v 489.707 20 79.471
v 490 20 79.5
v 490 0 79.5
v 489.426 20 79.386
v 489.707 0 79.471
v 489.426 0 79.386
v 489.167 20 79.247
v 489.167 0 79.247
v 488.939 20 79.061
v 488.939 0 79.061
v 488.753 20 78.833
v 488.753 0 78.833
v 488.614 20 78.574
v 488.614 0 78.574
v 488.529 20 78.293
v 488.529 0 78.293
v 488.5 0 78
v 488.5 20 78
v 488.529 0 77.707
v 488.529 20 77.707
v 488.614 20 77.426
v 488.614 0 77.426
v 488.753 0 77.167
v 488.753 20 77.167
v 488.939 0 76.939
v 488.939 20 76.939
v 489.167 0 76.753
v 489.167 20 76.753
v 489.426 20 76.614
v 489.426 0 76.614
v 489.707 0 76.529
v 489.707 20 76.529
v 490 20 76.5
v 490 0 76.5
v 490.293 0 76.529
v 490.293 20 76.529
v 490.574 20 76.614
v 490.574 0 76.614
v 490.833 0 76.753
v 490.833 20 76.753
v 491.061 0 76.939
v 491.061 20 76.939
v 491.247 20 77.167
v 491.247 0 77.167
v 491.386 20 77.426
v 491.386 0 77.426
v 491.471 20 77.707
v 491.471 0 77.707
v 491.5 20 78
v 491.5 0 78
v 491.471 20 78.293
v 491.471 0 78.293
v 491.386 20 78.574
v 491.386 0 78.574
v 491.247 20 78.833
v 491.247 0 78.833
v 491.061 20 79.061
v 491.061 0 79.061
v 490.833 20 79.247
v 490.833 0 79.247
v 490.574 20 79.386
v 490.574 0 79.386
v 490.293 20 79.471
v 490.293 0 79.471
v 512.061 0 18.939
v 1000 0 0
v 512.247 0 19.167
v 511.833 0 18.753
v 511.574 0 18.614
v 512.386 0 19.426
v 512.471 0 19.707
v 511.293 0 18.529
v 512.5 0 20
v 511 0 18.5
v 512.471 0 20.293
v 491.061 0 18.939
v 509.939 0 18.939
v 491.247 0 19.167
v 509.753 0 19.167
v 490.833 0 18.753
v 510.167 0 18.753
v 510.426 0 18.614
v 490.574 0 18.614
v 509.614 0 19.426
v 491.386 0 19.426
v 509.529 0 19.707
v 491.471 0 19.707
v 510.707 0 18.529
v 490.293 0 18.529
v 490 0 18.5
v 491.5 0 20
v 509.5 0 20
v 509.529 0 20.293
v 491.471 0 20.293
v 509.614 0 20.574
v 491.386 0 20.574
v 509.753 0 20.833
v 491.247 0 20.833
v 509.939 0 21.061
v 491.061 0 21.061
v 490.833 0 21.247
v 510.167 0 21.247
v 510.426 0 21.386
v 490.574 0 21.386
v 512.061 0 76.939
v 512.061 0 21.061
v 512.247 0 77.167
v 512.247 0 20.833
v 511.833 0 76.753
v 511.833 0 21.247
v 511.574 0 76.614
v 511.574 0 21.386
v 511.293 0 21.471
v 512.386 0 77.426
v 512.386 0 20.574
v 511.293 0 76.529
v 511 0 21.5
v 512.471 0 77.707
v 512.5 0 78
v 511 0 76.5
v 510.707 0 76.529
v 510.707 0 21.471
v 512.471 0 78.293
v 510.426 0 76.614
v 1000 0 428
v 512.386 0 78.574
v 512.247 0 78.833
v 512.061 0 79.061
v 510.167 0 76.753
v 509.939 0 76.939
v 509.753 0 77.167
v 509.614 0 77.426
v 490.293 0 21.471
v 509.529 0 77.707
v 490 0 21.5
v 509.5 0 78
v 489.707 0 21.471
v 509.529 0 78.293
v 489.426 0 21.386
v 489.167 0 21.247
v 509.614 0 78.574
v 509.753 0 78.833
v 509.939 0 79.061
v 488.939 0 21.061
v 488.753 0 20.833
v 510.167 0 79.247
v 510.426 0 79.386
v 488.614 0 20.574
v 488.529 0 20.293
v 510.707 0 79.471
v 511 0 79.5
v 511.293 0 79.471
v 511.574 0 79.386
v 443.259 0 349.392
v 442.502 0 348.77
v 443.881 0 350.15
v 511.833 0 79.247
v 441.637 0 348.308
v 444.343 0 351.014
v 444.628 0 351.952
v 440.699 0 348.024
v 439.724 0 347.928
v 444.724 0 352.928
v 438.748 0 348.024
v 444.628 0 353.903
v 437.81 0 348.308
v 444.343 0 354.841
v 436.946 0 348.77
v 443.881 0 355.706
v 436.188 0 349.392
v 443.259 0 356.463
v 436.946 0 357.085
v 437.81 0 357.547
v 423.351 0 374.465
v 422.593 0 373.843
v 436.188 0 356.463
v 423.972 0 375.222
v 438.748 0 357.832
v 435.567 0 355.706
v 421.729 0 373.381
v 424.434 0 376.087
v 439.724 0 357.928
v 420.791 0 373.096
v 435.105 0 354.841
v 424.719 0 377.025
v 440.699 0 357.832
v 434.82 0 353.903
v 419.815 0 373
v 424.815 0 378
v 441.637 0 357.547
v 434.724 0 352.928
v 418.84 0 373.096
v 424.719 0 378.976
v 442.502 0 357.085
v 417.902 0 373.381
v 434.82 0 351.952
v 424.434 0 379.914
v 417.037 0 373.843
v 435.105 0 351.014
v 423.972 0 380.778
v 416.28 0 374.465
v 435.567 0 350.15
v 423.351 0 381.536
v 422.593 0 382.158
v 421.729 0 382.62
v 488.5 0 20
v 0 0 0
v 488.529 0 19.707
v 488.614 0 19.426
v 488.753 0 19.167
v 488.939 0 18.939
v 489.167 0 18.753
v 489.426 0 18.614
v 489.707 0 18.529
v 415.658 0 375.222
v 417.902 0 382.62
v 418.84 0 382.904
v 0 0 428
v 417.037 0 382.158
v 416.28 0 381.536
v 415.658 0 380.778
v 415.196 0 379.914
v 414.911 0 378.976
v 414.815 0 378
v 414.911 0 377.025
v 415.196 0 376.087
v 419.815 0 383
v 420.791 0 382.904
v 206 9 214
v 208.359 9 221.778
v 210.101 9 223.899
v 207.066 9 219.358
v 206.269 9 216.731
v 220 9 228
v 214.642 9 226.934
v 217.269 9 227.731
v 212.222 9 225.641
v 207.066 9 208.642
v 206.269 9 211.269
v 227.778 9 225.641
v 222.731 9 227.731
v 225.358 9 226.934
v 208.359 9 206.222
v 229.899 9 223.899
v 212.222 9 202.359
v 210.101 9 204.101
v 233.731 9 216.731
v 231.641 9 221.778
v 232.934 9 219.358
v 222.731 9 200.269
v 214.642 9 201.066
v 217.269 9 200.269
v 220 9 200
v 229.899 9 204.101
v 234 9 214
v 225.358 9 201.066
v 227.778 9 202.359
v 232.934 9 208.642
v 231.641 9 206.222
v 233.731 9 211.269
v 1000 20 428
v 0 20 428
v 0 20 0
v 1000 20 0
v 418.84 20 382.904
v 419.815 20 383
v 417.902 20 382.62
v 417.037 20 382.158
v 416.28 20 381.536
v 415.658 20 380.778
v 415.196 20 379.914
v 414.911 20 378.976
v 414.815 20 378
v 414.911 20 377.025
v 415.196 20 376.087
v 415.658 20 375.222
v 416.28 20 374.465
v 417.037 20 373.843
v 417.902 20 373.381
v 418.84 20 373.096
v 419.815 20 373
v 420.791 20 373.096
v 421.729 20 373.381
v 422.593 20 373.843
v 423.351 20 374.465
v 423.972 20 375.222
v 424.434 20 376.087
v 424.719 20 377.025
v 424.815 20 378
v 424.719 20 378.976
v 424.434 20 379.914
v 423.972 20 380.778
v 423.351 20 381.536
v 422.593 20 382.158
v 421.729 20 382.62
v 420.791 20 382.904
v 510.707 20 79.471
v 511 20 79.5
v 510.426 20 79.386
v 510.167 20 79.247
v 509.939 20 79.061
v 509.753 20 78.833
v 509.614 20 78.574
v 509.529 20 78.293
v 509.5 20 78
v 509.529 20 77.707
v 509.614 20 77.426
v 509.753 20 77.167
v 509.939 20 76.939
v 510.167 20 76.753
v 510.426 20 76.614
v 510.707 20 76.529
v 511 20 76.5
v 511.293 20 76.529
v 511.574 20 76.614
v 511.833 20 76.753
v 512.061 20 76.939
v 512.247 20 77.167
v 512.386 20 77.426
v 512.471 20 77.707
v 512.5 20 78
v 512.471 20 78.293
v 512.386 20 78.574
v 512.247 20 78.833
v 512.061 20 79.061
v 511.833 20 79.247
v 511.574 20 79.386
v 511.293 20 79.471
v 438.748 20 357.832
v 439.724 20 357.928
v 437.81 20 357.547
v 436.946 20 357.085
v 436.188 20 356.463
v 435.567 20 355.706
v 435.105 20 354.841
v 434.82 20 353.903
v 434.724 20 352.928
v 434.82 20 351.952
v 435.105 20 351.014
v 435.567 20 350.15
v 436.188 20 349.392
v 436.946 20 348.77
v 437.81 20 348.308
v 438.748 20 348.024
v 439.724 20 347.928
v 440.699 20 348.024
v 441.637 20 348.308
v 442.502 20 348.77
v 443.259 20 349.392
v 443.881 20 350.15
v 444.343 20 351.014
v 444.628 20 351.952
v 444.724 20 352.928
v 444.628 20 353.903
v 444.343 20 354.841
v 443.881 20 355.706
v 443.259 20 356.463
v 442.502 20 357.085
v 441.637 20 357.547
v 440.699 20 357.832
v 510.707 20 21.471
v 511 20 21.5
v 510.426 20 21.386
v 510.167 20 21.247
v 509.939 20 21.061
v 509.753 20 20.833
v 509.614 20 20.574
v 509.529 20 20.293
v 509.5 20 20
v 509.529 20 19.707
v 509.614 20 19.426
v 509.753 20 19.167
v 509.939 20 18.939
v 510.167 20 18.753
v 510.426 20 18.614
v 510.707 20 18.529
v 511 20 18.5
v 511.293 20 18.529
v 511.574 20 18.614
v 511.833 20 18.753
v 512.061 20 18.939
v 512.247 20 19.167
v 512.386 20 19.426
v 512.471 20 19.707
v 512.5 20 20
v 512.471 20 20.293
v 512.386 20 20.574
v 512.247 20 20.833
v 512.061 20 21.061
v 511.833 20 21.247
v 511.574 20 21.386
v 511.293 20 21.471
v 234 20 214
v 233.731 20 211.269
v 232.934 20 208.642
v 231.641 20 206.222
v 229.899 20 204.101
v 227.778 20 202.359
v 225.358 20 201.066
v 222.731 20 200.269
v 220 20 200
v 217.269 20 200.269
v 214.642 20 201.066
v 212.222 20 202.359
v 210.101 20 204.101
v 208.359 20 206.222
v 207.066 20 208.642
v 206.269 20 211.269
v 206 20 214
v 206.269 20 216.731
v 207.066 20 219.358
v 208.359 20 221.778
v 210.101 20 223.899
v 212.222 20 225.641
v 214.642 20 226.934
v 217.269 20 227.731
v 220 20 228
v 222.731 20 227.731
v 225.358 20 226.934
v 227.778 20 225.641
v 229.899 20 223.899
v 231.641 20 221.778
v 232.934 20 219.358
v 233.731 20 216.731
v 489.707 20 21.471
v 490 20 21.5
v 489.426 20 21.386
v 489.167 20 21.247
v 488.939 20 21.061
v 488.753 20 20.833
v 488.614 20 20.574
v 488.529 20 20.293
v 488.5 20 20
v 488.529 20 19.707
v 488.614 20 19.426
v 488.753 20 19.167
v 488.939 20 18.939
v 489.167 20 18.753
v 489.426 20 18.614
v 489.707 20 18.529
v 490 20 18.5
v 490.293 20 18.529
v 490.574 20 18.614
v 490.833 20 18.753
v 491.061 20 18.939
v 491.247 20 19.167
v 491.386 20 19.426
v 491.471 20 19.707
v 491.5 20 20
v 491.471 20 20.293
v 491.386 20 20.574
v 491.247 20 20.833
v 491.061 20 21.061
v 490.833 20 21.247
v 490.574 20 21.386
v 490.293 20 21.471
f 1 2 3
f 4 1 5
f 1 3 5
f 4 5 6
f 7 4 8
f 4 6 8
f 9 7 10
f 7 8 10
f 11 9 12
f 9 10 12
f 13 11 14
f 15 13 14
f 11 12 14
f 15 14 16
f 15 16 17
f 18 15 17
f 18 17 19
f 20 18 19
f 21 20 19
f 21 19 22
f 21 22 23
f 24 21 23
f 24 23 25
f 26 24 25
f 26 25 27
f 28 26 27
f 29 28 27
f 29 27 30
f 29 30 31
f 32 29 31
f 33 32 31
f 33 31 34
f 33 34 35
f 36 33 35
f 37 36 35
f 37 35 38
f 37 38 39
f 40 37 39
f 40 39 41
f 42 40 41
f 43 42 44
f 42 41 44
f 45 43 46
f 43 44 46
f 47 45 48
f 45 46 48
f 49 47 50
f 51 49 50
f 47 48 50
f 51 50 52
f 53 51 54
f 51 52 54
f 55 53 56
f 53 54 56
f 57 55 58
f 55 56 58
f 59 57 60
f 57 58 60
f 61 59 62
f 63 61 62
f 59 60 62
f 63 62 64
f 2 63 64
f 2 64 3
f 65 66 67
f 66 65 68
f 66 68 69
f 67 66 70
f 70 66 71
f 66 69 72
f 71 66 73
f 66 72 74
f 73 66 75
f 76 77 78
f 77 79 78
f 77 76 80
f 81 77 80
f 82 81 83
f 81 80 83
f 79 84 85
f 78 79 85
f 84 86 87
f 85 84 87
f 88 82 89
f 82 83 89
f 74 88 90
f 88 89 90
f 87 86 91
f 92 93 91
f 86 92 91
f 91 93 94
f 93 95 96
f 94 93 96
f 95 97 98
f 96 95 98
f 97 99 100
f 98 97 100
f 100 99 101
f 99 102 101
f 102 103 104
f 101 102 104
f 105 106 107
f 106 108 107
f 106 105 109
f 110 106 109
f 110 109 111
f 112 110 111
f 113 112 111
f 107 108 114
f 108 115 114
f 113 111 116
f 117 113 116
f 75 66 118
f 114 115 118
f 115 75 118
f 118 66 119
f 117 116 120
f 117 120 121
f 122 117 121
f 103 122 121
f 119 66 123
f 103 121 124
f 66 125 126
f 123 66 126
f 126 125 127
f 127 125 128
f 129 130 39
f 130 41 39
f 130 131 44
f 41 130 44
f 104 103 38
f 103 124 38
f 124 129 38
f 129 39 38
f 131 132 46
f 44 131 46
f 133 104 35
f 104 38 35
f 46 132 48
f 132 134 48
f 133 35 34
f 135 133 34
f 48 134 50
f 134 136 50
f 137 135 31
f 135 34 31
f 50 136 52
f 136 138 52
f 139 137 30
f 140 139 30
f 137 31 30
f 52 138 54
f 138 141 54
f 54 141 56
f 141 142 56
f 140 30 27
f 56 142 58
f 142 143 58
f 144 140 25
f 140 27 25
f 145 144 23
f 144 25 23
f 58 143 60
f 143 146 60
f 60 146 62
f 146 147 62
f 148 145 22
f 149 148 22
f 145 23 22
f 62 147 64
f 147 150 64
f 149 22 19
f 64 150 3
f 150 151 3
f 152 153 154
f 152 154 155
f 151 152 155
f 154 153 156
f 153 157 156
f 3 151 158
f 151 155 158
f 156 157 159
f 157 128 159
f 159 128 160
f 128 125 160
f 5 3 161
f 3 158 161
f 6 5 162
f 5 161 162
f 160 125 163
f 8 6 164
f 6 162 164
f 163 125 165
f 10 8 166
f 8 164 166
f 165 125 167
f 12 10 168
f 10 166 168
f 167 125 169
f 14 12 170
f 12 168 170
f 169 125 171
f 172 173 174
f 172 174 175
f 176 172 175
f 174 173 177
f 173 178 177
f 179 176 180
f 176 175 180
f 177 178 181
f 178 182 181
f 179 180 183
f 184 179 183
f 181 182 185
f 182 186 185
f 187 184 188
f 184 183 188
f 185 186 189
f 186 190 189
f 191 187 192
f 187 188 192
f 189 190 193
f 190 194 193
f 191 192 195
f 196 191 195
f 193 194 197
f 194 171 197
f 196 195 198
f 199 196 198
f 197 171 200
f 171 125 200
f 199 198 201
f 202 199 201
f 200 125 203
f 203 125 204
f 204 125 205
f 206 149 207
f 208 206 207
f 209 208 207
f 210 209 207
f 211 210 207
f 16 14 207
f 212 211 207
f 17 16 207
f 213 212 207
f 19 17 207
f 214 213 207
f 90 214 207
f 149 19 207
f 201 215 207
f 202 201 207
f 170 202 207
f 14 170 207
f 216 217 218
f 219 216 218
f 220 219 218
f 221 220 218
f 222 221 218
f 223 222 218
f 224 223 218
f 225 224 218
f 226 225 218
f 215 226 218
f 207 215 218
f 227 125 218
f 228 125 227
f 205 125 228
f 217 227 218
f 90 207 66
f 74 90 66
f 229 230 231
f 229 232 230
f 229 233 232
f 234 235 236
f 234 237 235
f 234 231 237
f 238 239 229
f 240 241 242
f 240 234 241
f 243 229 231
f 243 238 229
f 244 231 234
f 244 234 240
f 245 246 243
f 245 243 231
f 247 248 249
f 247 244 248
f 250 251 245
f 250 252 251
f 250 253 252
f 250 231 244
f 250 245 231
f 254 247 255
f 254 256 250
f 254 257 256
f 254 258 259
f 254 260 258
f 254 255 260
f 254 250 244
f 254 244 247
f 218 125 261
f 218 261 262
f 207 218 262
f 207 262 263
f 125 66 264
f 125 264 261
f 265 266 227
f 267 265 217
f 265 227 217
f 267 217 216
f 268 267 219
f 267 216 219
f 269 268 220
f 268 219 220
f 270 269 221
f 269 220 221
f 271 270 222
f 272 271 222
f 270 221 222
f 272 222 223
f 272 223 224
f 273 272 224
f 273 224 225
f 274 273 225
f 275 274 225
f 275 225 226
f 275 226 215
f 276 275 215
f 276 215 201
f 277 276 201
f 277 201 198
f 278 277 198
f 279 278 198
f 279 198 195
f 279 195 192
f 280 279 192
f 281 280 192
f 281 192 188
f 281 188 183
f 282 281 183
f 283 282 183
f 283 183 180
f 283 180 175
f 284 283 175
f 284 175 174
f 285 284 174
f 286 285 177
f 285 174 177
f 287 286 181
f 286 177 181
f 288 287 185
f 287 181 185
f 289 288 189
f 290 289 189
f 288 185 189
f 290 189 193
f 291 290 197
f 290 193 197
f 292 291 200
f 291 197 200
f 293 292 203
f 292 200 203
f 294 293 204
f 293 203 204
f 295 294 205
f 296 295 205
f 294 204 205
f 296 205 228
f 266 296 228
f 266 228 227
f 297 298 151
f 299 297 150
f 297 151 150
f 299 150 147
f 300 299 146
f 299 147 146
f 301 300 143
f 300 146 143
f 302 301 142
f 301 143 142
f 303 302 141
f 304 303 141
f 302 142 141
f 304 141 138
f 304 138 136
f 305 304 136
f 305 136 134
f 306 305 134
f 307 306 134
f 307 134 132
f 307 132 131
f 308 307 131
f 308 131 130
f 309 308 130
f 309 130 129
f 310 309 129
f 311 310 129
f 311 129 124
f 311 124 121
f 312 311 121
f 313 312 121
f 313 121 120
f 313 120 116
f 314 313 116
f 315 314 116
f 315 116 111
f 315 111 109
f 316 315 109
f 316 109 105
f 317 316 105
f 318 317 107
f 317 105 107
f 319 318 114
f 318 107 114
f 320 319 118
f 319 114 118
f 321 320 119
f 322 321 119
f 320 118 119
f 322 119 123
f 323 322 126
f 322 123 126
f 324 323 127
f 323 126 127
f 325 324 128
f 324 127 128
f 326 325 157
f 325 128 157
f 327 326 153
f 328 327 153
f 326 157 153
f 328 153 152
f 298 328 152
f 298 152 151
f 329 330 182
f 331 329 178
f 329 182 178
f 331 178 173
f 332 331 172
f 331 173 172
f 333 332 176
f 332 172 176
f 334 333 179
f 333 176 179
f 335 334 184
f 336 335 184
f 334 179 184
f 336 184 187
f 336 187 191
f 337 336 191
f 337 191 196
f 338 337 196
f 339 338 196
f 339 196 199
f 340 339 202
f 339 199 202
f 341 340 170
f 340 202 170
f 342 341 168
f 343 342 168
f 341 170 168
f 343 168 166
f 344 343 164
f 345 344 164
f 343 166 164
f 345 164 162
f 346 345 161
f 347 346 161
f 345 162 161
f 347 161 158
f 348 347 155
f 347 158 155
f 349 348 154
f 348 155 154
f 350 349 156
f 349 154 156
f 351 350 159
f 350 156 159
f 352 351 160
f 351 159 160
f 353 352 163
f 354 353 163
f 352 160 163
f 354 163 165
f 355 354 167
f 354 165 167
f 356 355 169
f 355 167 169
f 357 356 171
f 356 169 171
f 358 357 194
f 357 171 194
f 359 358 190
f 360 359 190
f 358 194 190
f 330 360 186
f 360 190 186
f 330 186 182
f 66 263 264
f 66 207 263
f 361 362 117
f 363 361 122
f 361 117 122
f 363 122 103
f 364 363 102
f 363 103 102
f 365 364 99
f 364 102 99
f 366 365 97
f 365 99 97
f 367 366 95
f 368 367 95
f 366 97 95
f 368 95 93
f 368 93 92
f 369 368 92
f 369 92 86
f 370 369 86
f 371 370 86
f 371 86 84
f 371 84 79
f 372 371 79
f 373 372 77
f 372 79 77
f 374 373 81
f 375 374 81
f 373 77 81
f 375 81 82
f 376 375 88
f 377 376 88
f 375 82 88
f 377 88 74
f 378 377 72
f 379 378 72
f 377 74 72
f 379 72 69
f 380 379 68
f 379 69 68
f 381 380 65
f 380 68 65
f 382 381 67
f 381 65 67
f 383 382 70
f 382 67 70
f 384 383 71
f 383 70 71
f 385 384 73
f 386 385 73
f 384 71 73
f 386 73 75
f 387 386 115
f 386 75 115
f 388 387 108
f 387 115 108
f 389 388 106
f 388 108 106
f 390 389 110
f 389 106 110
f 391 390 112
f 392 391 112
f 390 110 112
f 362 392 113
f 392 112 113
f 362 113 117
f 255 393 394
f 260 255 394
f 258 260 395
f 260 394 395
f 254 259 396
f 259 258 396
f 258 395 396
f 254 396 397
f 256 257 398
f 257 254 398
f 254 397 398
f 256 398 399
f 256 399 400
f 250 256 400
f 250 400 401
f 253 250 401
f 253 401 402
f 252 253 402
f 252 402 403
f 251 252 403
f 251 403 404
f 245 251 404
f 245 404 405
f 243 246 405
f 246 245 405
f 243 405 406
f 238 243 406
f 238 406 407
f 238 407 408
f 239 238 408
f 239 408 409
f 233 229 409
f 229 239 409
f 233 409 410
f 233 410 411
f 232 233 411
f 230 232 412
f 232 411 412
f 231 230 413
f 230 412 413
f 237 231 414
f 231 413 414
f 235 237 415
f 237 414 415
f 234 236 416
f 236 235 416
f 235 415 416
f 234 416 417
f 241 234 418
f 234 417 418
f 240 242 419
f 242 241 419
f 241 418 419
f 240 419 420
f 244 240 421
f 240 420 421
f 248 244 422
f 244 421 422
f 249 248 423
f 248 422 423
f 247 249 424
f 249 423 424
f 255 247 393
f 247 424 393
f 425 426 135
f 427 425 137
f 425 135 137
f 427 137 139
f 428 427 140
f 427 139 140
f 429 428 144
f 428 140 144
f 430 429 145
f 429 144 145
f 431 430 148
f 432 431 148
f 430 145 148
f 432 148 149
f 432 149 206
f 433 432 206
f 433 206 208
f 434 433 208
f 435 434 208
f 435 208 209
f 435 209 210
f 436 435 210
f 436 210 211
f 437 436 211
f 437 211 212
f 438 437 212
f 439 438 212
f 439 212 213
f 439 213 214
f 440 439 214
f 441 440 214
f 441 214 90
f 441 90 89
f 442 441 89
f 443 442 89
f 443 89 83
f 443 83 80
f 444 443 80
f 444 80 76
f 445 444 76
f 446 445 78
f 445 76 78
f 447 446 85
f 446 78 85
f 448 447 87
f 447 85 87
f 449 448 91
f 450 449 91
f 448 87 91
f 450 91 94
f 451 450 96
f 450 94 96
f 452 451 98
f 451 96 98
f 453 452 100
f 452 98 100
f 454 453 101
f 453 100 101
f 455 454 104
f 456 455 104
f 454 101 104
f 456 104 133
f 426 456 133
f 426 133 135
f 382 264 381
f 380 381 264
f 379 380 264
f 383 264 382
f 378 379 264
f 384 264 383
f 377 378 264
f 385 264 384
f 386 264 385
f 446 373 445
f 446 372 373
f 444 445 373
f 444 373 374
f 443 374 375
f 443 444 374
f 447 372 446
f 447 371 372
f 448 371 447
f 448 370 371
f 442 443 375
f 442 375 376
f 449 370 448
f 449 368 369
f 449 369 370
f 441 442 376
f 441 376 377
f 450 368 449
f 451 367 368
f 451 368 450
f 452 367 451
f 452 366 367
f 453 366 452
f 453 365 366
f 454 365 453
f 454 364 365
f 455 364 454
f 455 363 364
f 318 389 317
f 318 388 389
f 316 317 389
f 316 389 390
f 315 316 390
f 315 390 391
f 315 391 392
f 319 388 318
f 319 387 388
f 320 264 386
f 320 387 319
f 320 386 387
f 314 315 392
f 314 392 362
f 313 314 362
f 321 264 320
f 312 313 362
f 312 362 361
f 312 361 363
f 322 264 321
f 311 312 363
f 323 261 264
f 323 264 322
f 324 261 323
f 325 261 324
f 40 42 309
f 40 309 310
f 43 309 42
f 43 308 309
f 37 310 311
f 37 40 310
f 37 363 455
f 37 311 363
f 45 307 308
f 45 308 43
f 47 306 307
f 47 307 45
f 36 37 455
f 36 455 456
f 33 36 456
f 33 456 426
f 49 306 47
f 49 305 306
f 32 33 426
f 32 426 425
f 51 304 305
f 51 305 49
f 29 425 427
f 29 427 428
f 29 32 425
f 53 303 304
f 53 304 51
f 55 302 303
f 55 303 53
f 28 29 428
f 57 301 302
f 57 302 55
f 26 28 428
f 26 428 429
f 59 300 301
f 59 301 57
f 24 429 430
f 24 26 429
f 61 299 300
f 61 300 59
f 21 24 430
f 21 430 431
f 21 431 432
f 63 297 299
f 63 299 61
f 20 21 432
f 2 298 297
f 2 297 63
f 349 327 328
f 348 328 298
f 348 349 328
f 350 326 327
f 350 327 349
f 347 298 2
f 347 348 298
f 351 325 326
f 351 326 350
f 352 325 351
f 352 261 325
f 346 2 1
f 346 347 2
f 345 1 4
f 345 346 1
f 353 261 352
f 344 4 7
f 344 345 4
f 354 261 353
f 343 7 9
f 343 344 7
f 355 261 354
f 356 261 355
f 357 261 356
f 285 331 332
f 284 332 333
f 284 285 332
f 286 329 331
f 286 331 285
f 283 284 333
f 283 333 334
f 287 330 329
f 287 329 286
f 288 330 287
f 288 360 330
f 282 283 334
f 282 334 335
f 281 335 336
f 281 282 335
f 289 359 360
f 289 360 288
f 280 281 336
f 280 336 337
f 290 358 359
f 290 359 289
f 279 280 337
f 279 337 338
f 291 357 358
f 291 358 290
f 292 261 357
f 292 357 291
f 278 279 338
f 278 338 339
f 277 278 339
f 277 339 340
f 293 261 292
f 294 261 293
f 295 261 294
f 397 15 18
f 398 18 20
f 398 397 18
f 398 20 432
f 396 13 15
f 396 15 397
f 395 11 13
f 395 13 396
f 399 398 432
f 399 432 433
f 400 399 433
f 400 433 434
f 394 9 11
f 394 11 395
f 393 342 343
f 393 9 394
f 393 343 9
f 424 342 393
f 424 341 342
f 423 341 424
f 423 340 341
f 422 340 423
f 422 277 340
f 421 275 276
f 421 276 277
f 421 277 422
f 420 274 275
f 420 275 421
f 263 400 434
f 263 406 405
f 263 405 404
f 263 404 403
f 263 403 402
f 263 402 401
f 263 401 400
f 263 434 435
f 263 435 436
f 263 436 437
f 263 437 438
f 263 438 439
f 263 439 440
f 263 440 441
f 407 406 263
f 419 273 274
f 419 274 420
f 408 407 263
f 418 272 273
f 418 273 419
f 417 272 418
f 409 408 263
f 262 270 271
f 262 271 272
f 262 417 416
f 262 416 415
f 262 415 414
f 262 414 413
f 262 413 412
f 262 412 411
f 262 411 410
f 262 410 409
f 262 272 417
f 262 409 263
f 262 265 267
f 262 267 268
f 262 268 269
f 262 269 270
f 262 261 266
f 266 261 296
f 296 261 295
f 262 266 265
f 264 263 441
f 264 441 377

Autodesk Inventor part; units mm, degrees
ref_plane "YZ Plane" through (0, 0, 0) normal (1, 0, 0) x (0, 1, 0)
ref_plane "XZ Plane" through (0, 0, 0) normal (0, 1, 0) x (-1, 0, 0)
ref_plane "XY Plane" through (0, 0, 0) normal (0, 0, 1) x (1, 0, 0)
sketch "Skizze1" plane through (0, 0, 0) normal (0, 1, 0) x (-1, 0, 0)
  line L0 (0, 0) -> (-1000, 0)
  line L1 (-1000, 0) -> (-1000, 428)
  line L2 (-1000, 428) -> (0, 428)
  line L3 (0, 428) -> (0, 0)
  dimension "d0" = 1000
  dimension "d1" = 428
extrude "Extrusion1" add sketch "Skizze1" along normal blind 20
sketch "Skizze2" plane through (0, 20, 0) normal (0, 1, 0) x (1, 0, 0)
  line L0 (0, 0) -> (0, -428) projected
  line L1 (0, -428) -> (220, -428)
  line L2 (220, -428) -> (220, -214)
  circle A0 centre (220, -214) radius 14
  dimension "d4" = 220
  dimension "d5" = 214
  dimension "d6" = 28
extrude "Extrusion2" cut sketch "Skizze2" against normal blind 11
sketch "Skizze3" plane through (0, 20, 0) normal (0, 1, 0) x (1, 0, 0)
  line L0 (0, -429.5296) -> (419.9972, -428)
  line L1 (0, -428) -> (1000, -428) projected
  line L2 (419.9972, -428) -> (419.8151, -378.0003)
  line L3 (419.8151, -378.0003) -> (439.815, -377.9275)
  line L4 (439.815, -377.9275) -> (439.7239, -352.9277)
  point P0 (0, 0)
  dimension "d9" = 420
  dimension "d10" = 50
  dimension "d11" = 20
  dimension "d12" = 25
hole "Bohrung1" at (419.8151, 20, 378.0003) at (439.7239, 20, 352.9277) direction (0, -1, 0) diameter 10 depth 20 tip angle 118
sketch "Skizze4" plane through (0, 20, 0) normal (0, 1, 0) x (1, 0, 0)
  line L0 (1000, 0) -> (0, 0) projected
  line L1 (0, 0) -> (490, 0)
  line L2 (490, 0) -> (505, 0)
  line L3 (490, 0) -> (490, -15)
  line L4 (490, -15) -> (490, -20)
  circle A0 centre (490, -20) radius 1.5
  line L5 (490, -20) -> (511, -20)
  circle A1 centre (511, -20) radius 1.5
  dimension "d20" = 490
  dimension "d22" = 15
  dimension "d23" = 5
  dimension "d24" = 3
  dimension "d25" = 21
  dimension "d26" = 3
hole "Bohrung2" at (490, 20, 20) at (511, 20, 20) direction (0, -1, 0) diameter 3 end through all
sketch "Skizze5" plane through (0, 20, 0) normal (0, 1, 0) x (1, 0, 0)
  circle A0 centre (490, -20) radius 1.5 projected
  line L0 (490, -20) -> (490, -78)
  circle A1 centre (511, -20) radius 1.5 projected
  line L1 (511, -20) -> (511, -78)
  point P0 (0, 0)
  dimension "d34" = 58
  dimension "d35" = 58
hole "Bohrung3" at (511, 20, 78) at (490, 20, 78) direction (0, -1, 0) diameter 3 end through all
properties part number "Grundplatte" material "Holz (Birke)"
